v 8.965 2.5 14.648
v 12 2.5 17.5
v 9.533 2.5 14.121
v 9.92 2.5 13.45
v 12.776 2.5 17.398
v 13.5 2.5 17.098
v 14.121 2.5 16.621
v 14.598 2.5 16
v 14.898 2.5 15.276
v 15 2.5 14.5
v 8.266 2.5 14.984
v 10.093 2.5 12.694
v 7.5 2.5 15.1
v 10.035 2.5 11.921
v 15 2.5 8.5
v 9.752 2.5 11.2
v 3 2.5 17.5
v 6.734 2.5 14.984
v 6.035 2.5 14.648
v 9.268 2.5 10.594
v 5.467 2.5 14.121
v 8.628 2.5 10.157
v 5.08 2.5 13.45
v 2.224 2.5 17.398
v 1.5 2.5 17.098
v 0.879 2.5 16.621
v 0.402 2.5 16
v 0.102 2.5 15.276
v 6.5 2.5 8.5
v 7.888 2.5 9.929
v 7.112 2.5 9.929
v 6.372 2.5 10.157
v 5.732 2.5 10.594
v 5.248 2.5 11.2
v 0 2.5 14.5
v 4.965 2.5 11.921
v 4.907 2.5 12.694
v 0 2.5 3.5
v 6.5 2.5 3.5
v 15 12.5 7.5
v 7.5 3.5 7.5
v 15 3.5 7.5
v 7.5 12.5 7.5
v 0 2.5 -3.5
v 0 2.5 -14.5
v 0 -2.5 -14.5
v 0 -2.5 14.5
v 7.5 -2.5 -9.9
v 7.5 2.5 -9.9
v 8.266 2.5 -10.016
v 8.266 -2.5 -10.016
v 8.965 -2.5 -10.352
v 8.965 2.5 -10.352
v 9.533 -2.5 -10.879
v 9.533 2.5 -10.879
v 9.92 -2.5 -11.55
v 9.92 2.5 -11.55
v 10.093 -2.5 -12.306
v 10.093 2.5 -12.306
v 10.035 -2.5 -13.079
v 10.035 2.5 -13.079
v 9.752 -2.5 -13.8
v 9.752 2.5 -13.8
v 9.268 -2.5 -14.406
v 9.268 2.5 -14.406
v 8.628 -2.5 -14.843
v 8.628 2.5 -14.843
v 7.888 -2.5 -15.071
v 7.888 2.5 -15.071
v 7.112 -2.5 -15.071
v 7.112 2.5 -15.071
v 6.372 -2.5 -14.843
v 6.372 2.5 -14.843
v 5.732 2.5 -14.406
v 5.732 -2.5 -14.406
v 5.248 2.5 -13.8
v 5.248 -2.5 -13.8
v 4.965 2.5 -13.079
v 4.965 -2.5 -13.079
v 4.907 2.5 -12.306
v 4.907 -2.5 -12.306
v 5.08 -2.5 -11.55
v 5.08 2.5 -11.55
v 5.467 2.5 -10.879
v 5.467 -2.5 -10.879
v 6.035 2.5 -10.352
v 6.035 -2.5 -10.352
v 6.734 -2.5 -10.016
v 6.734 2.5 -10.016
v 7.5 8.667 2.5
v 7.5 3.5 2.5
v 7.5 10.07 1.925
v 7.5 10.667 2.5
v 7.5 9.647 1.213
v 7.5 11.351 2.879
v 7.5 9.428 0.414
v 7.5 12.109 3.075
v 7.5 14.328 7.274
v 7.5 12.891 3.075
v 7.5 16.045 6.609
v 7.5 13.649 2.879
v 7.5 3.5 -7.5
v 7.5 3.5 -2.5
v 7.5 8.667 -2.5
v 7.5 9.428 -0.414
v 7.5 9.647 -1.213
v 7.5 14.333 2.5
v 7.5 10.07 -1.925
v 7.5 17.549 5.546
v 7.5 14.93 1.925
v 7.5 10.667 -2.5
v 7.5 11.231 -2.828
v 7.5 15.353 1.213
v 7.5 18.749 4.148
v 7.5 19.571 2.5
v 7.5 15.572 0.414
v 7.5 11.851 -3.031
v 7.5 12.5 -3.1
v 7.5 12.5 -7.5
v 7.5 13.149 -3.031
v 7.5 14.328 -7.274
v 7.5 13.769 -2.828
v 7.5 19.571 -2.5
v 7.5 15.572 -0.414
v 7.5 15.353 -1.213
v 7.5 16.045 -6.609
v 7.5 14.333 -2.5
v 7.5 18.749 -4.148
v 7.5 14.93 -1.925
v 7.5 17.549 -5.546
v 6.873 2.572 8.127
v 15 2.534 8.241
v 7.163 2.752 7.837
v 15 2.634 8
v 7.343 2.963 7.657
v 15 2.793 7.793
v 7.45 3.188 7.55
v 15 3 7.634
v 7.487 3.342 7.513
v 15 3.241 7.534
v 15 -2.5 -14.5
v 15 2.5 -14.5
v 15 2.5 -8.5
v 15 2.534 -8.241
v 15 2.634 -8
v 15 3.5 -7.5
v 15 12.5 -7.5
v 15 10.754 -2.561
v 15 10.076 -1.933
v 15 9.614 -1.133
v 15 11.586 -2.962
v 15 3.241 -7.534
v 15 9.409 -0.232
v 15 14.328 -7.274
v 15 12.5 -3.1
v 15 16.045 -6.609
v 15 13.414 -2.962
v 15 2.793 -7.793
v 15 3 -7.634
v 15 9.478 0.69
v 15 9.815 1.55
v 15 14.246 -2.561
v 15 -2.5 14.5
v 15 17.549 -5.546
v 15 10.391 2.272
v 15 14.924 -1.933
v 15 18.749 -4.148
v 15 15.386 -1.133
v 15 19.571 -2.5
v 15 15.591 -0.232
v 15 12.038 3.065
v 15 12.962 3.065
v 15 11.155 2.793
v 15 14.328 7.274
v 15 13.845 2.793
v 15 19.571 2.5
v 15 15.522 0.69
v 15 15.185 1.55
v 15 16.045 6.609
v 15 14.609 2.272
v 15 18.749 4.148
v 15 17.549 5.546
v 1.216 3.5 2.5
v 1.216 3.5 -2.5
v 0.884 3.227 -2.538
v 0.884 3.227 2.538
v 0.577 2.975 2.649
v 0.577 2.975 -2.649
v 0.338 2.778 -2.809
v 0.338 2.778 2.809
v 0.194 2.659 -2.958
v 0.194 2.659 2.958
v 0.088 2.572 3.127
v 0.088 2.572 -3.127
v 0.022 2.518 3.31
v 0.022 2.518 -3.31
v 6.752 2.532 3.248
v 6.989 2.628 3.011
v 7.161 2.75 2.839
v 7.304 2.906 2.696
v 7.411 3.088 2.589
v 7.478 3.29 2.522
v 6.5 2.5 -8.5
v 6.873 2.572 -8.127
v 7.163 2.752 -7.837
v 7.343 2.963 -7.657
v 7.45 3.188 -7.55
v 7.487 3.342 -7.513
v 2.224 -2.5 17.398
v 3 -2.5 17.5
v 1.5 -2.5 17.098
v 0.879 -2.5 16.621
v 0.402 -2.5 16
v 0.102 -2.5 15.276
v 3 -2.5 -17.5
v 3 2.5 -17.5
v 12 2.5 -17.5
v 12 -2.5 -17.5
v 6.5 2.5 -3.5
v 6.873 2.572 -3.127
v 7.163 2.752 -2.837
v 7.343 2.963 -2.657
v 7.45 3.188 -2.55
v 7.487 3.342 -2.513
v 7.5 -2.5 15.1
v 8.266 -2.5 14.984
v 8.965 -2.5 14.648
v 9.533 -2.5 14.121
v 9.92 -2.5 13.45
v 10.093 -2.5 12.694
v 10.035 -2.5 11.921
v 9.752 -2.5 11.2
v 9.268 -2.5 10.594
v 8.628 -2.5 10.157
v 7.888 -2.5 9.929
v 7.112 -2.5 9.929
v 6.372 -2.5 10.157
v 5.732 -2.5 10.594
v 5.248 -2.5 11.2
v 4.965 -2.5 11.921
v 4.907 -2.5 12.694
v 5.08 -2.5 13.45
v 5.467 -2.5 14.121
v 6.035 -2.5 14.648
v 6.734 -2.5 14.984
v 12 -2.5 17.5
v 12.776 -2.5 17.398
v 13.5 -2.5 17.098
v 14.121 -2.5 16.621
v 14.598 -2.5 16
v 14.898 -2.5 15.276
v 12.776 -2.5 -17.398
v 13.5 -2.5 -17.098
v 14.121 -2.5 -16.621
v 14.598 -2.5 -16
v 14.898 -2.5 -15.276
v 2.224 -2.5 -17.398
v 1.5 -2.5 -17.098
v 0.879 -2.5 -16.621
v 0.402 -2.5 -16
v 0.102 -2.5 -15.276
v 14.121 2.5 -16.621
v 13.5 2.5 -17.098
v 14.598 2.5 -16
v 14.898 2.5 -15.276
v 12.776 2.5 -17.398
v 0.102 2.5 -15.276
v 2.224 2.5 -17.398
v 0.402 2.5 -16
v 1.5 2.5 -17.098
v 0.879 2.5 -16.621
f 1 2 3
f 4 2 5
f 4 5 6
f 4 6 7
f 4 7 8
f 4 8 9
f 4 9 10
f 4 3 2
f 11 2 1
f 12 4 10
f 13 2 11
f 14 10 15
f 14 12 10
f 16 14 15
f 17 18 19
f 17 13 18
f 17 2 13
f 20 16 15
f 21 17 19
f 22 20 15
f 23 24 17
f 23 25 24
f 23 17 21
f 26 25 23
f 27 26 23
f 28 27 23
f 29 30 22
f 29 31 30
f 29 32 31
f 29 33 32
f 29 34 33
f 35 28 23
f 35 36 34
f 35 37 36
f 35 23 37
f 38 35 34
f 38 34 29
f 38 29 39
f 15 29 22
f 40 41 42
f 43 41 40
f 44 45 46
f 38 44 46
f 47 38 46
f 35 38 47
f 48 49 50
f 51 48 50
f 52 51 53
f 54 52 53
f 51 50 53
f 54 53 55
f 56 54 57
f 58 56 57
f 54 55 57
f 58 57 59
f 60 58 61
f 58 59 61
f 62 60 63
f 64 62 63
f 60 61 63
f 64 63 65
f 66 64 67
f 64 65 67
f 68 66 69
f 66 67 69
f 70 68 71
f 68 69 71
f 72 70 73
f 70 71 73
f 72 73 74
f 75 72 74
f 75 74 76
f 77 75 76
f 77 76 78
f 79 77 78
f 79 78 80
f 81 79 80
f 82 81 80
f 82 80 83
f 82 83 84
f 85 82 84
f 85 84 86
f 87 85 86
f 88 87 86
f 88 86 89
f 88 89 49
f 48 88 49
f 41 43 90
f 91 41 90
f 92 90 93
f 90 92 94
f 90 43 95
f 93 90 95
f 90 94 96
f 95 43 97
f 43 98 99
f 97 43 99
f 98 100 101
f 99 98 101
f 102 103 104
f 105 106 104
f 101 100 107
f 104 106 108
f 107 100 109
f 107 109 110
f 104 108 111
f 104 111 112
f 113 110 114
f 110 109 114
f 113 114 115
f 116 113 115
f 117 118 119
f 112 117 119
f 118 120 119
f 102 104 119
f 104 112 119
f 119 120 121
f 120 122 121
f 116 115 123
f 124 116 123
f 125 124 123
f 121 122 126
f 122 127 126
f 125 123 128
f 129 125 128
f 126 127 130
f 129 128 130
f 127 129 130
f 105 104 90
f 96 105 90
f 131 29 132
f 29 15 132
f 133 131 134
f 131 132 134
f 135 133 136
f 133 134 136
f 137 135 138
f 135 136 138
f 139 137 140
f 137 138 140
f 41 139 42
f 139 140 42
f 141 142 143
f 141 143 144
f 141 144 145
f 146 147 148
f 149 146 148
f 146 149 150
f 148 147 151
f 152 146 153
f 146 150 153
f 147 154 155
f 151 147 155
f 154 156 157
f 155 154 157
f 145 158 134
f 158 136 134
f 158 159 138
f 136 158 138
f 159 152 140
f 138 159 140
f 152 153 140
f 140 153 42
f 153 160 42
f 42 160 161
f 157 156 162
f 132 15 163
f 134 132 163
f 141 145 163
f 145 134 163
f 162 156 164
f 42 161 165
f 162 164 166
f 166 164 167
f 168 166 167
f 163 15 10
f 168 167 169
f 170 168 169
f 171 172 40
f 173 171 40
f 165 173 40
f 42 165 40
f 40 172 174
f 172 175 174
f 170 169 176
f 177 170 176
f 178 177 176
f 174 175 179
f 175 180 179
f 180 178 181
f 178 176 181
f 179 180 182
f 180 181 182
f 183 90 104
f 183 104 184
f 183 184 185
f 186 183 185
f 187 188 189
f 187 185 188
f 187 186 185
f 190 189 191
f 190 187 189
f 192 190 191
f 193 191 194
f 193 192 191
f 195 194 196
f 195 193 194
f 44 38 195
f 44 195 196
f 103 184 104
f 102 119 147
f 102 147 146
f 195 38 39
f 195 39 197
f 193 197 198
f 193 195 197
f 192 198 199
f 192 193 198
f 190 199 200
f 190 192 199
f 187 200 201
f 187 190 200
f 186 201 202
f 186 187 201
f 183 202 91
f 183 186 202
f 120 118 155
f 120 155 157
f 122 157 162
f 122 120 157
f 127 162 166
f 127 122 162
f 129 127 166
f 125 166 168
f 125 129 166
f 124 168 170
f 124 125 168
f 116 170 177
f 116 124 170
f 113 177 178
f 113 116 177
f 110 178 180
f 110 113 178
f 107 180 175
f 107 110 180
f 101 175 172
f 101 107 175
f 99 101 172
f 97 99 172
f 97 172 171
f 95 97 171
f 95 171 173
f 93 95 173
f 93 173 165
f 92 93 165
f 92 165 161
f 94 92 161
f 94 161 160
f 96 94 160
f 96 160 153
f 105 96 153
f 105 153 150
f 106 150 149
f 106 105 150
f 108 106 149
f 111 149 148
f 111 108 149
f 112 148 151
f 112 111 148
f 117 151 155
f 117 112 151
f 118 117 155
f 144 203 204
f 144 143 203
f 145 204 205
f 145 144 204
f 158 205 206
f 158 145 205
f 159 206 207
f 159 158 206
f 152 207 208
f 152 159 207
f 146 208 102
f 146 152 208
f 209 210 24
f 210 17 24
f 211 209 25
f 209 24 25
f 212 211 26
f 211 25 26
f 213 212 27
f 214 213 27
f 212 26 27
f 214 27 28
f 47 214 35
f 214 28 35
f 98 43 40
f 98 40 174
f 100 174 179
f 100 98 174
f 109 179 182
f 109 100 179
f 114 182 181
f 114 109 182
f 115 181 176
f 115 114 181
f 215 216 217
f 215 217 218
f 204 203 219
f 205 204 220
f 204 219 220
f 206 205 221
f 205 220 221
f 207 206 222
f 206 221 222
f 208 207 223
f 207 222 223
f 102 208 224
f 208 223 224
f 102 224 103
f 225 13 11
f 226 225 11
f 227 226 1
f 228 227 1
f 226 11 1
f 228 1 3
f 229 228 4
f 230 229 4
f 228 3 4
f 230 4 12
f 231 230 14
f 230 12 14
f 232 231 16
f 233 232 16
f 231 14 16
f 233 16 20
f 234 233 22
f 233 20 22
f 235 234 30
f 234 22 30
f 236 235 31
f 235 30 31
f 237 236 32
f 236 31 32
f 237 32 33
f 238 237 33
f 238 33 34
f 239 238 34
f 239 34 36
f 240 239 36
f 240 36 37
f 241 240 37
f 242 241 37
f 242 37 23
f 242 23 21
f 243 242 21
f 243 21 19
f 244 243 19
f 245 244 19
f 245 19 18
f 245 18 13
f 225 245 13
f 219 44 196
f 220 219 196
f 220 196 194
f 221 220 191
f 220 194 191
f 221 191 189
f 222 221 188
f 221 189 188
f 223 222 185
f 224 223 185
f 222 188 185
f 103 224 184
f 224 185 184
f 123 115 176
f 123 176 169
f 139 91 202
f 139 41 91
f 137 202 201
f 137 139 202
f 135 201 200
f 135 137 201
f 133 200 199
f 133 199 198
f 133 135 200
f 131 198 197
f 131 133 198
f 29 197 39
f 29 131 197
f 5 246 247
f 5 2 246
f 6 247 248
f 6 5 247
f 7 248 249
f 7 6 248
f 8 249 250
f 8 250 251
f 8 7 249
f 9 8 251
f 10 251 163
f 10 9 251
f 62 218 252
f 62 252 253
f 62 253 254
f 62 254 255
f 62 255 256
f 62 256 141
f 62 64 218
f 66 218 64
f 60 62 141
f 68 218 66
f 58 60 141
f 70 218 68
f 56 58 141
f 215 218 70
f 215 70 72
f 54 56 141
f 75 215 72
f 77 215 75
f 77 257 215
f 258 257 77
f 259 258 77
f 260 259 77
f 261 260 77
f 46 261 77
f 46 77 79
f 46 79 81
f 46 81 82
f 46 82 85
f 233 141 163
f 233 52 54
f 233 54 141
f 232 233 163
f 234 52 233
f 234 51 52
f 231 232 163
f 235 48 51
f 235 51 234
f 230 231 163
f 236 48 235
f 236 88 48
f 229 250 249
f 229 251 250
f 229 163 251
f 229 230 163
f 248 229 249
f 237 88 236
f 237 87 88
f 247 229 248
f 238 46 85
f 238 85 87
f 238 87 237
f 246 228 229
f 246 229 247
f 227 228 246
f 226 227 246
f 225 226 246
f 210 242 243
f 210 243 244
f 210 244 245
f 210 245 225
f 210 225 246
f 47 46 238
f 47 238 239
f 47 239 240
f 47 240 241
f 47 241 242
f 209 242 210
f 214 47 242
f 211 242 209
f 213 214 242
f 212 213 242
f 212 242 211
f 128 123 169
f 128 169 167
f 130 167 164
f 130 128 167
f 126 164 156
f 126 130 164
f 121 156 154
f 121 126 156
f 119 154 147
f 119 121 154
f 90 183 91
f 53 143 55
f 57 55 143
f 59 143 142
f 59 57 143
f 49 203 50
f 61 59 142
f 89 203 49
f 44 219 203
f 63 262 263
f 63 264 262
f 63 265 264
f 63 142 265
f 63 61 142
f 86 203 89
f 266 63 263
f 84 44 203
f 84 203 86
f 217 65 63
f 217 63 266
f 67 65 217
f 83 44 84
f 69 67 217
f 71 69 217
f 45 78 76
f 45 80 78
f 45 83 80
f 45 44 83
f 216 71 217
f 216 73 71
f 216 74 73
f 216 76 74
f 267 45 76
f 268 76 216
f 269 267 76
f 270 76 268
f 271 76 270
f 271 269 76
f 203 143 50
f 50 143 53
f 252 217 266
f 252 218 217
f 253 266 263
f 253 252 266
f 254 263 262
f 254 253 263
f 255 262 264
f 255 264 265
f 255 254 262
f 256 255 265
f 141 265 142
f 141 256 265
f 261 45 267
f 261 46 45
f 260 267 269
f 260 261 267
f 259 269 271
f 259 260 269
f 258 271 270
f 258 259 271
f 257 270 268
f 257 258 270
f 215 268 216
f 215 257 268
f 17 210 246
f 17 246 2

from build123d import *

# Parameters (mm, degrees)
SKETCH1_R           = 3.1
BOSS_EXTRUDE1_DEPTH = 15
SKETCH2_R           = 2.6
CUT_EXTRUDE2_DEPTH  = 32.912098558
CUT_EXTRUDE4_REACH  = 33.912
SKETCH3_W           = 7.5
SKETCH3_H           = 5
SKETCH4_W           = 7.5
SKETCH4_H           = 5.238037534
CUT_EXTRUDE5_DEPTH  = 5
FILLET1_R           = 1
FILLET2_R           = 3


with BuildPart() as part:
    # Sketch1 → Boss-Extrude1 (new body)
    with BuildSketch(Plane(origin=(0, 0, 0), x_dir=(0, 0, -1), z_dir=(1, 0, 0))):
        with BuildLine():
            Line((7.5, 2.5), (17.5, 2.5))
            Line((17.5, 2.5), (17.5, -2.5))
            Line((17.5, -2.5), (-17.5, -2.5))
            Line((-17.5, -2.5), (-17.5, 2.5))
            Line((-17.5, 2.5), (-7.5, 2.5))
            Line((-7.5, 2.5), (-7.5, 12.5))
            ThreePointArc((-7.5, 12.5), (-6.123724357, 16.830127019), (-2.5, 19.571067812))
            Line((-2.5, 19.571067812), (2.5, 19.571067812))
            ThreePointArc((2.5, 19.571067812), (6.123724357, 16.830127019), (7.5, 12.5))
            Line((7.5, 12.5), (7.5, 2.5))
        make_face()
        with Locations((0, 12.5)):
            Circle(SKETCH1_R, mode=Mode.SUBTRACT)
    extrude(amount=BOSS_EXTRUDE1_DEPTH)

    # Sketch2 → Cut-Extrude2 (cut, through all)
    with BuildSketch(Plane(origin=(0, 19.571067812, 0), x_dir=(1, 0, 0), z_dir=(0, 1, 0))):
        with Locations(Location((7.5, 12.5, 0), (0, 0, 270))):
            Circle(SKETCH2_R)
        with Locations(Location((7.5, -12.5, 0), (0, 0, 270))):
            Circle(SKETCH2_R)
    extrude(amount=-CUT_EXTRUDE2_DEPTH, mode=Mode.SUBTRACT)

    # Cut-Extrude4: up to this face of the body (flat: up to its plane)
    cut_extrude4_end = Plane(part.part.faces().sort_by_distance((7.5, 2.5, 17.319722436))[0])
    # Sketch3 → Cut-Extrude4 (cut, up to the picked face)
    with BuildSketch(Plane(origin=(0, 19.571067812, 0), x_dir=(1, 0, 0), z_dir=(0, 1, 0)), mode=Mode.PRIVATE) as cut_extrude4_sk1:
        with Locations((3.75, -5)):
            Rectangle(SKETCH3_W, SKETCH3_H)
    cut_extrude4_tool1 = split(extrude(cut_extrude4_sk1.sketch, amount=-CUT_EXTRUDE4_REACH, mode=Mode.PRIVATE), bisect_by=cut_extrude4_end, keep=Keep.BOTH, mode=Mode.PRIVATE)
    # Sketch3 → Cut-Extrude4 (cut, up to the picked face)
    with BuildSketch(Plane(origin=(0, 19.571067812, 0), x_dir=(1, 0, 0), z_dir=(0, 1, 0)), mode=Mode.PRIVATE) as cut_extrude4_sk2:
        with Locations((3.75, 5)):
            Rectangle(SKETCH3_W, SKETCH3_H)
    cut_extrude4_tool2 = split(extrude(cut_extrude4_sk2.sketch, amount=-CUT_EXTRUDE4_REACH, mode=Mode.PRIVATE), bisect_by=cut_extrude4_end, keep=Keep.BOTH, mode=Mode.PRIVATE)
    add(cut_extrude4_tool1.solids().sort_by(Axis((3.75, 19.571068, 5), (0, -1, 0)))[0], mode=Mode.SUBTRACT)
    add(cut_extrude4_tool2.solids().sort_by(Axis((3.75, 19.571068, -5), (0, -1, 0)))[0], mode=Mode.SUBTRACT)

    # Sketch4 → Cut-Extrude5 (cut)
    with BuildSketch(Plane.XY.offset(2.5)):
        Polygon((7.5, 8.666969722), (0, 2.5), (0, 10.666969722), (7.5, 10.666969722), align=None)
        with Locations((3.75, 16.952049045)):
            Rectangle(SKETCH4_W, SKETCH4_H)
    extrude(amount=-CUT_EXTRUDE5_DEPTH, mode=Mode.SUBTRACT)

    # Fillet1
    fillet1_edges = [part.edges().sort_by_distance(p)[0] for p in [
        (11.25, 2.5, 7.5),
        (11.25, 2.5, -7.5),
        (7.5, 2.5, -5),
        (3.75, 2.5, -2.5),
        (7.5, 2.5, 5),
        (3.75, 2.5, 2.5),
    ]]
    fillet(fillet1_edges, radius=FILLET1_R)

    # Fillet2
    fillet2_edges = [part.edges().sort_by_distance(p)[0] for p in [
        (0, 0, 17.5),
        (0, 0, -17.5),
        (15, 0, 17.5),
        (15, 0, -17.5),
    ]]
    fillet(fillet2_edges, radius=FILLET2_R)


solid = part.part
